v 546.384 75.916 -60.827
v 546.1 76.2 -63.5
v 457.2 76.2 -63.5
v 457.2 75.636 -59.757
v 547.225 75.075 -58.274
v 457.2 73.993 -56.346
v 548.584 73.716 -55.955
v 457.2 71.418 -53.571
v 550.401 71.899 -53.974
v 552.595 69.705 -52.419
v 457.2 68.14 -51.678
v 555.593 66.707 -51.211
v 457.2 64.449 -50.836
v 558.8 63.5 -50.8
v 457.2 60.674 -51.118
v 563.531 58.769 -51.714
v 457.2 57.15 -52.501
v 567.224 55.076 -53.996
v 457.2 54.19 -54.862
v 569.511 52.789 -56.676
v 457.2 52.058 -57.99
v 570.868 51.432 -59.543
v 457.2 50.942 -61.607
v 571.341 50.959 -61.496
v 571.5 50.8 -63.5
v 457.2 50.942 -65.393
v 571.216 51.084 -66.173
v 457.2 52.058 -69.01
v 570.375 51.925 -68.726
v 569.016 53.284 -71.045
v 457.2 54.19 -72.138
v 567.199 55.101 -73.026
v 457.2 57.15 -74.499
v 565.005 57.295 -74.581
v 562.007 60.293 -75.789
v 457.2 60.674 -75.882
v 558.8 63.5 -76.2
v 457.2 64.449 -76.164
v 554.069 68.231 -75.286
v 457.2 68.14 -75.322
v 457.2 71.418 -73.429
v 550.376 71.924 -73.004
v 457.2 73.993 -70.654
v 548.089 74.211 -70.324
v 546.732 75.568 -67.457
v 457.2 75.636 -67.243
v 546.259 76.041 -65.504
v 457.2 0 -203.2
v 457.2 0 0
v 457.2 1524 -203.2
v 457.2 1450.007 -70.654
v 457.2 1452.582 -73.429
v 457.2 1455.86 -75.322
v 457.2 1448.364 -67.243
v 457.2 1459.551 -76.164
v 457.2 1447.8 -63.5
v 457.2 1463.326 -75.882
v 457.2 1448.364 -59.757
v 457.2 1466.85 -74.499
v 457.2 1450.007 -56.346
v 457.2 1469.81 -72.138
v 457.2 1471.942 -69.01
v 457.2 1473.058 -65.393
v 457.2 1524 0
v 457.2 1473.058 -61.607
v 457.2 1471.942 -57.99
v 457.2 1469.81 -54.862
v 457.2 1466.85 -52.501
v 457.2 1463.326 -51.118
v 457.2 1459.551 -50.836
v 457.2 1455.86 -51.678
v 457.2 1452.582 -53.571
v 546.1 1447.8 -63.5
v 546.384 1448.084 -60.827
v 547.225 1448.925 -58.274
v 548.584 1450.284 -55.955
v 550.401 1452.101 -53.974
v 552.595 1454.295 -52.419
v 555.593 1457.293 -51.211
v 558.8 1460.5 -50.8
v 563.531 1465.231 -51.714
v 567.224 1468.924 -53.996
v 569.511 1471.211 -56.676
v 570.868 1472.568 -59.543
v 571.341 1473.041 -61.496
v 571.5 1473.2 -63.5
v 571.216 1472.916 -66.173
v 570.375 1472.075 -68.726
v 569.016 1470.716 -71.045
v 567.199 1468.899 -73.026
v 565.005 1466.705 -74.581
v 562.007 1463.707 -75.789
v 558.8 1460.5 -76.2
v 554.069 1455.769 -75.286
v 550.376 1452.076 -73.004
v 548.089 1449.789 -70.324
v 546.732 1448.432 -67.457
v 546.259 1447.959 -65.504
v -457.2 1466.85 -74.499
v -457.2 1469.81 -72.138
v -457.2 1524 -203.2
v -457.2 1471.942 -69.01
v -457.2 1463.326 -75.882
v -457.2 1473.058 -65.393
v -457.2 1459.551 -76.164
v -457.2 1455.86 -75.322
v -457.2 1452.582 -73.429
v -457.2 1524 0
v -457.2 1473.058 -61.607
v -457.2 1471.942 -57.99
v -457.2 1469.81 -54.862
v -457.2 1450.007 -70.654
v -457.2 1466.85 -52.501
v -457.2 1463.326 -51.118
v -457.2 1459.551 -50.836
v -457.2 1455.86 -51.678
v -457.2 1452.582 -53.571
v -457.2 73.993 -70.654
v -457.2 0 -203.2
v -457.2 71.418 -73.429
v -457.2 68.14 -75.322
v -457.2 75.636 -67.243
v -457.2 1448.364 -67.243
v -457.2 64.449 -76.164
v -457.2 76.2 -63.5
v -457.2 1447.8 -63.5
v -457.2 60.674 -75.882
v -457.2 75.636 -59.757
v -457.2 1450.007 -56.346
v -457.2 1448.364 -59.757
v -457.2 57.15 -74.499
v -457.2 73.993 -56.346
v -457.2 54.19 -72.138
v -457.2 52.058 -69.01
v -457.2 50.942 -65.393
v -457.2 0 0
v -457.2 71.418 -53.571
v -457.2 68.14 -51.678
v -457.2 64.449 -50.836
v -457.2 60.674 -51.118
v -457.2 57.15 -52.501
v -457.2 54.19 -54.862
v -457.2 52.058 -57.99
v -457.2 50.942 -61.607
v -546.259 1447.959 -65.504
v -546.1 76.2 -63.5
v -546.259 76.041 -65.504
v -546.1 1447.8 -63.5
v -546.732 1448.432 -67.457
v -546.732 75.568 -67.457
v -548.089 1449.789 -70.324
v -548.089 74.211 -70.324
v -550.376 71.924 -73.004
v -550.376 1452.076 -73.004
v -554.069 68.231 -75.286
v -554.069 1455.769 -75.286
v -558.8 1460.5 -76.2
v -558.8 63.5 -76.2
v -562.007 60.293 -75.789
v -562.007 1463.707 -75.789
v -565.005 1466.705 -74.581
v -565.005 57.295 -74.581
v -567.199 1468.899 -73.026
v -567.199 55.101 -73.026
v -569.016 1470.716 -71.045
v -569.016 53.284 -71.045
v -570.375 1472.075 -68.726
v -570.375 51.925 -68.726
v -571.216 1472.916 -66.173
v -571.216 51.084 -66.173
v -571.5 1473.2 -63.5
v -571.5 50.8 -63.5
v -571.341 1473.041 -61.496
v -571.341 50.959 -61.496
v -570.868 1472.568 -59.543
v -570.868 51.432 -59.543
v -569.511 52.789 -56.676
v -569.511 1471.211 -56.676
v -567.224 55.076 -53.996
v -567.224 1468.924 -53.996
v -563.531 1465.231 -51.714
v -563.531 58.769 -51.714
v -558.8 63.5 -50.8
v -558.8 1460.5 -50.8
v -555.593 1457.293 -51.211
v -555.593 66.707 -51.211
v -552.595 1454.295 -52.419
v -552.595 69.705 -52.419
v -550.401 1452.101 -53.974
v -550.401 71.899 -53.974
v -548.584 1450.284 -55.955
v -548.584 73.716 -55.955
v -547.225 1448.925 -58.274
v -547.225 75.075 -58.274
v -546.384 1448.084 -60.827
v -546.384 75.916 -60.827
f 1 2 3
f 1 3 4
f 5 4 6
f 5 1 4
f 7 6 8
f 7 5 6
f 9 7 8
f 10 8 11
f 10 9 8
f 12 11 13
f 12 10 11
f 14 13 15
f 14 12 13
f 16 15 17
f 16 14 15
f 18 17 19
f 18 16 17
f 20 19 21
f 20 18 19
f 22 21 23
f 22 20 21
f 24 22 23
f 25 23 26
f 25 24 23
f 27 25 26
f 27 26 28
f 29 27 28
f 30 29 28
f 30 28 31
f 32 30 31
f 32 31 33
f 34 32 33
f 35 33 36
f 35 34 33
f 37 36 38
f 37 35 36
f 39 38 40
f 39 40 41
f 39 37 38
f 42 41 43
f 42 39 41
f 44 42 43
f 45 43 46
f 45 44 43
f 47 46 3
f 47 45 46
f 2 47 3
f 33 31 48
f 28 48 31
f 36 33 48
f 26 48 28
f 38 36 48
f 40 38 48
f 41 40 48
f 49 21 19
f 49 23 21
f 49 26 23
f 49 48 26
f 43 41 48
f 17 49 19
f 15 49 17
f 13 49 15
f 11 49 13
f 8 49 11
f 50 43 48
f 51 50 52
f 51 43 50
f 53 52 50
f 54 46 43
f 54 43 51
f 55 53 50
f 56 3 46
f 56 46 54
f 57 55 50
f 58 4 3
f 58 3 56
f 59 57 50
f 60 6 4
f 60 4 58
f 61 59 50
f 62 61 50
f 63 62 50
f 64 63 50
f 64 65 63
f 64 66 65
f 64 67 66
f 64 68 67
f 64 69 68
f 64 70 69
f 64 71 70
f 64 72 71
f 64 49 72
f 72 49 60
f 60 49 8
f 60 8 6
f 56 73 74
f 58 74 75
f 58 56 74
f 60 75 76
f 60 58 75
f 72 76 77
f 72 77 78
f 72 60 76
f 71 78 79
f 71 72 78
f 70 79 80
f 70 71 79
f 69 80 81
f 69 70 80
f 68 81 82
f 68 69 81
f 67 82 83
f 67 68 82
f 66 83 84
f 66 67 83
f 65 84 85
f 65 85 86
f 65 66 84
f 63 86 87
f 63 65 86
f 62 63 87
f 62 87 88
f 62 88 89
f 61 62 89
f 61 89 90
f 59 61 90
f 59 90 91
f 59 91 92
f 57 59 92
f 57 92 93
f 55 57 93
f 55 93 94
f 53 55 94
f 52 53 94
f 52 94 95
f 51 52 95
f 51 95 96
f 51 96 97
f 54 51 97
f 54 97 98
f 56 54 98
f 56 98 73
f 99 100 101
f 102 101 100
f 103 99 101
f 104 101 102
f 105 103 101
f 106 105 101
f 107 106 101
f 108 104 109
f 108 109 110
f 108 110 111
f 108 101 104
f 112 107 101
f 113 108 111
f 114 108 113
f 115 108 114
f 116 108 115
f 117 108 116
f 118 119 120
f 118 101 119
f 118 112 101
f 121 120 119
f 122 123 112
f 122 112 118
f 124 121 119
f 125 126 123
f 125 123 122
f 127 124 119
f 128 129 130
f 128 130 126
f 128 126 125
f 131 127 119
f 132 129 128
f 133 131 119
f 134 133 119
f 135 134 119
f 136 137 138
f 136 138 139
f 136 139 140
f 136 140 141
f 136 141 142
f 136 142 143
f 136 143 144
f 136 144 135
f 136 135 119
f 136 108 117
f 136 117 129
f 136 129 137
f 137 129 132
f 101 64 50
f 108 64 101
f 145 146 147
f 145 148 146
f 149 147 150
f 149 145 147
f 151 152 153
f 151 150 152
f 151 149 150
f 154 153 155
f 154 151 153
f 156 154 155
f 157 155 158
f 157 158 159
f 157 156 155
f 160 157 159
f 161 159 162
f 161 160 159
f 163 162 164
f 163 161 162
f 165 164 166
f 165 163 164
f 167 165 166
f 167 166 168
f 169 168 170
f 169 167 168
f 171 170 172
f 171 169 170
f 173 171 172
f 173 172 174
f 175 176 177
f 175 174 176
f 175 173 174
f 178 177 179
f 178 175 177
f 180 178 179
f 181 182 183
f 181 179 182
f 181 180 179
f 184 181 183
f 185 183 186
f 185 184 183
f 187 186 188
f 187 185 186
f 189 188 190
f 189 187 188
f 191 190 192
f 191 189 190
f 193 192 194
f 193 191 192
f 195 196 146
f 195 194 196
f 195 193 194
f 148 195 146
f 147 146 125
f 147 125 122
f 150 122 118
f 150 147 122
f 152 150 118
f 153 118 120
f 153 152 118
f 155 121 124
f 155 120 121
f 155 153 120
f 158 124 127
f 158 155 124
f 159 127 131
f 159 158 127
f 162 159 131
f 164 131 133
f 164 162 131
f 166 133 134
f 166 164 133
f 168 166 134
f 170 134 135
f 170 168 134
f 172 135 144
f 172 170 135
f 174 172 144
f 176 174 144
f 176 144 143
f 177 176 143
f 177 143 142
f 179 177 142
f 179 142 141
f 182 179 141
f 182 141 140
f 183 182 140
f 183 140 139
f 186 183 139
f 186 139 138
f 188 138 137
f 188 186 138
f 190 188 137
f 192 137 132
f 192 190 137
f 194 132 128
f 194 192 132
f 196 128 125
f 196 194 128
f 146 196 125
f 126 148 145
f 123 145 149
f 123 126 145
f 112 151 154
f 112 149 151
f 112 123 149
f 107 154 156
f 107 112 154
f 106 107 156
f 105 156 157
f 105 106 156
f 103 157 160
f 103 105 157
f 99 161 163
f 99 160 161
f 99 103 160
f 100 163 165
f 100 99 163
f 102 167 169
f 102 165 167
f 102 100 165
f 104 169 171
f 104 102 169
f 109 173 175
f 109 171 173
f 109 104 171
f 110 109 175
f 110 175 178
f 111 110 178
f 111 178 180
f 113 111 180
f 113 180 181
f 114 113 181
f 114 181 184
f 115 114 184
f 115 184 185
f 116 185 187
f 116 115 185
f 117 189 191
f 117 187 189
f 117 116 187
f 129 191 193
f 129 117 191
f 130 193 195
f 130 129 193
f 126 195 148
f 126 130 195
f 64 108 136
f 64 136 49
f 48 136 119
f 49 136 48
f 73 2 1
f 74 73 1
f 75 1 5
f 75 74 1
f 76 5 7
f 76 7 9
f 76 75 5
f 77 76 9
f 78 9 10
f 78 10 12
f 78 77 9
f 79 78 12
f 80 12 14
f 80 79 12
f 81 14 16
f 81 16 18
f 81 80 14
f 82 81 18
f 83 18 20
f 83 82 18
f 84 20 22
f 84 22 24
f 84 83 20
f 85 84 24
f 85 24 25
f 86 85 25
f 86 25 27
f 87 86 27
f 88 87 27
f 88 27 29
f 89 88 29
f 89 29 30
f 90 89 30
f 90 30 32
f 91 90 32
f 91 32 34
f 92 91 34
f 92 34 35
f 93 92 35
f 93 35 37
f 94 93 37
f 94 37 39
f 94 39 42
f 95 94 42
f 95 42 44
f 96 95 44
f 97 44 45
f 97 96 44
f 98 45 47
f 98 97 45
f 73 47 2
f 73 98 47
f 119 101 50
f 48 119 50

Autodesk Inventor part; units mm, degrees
ref_plane "PLANE IN" through (0, 0, 0) normal (0, 1, 0) x (-1, 0, 0)
ref_plane "PLANE OUT" through (0, 1524, 0) normal (0, 1, 0) x (-1, 0, 0)
ref_plane "PLANE CTR" through (0, 0, 0) normal (1, 0, 0) x (0, 1, 0)
ref_plane "PLANE RH" through (457.2, 0, 0) normal (1, 0, 0) x (0, 1, 0)
ref_plane "PLANE LH" through (-457.2, 0, 0) normal (1, 0, 0) x (0, 1, 0)
ref_plane "PLANE TOP" through (0, 0, 0) normal (0, 0, 1) x (1, 0, 0)
ref_plane "PLANE BOT" through (0, 0, -203.2) normal (0, 0, 1) x (1, 0, 0)
ref_plane "PLANE HANDLE RH" through (558.8, 0, 0) normal (1, 0, 0) x (0, 1, 0)
ref_plane "PLANE HANDLE LH" through (-558.8, 0, 0) normal (1, 0, 0) x (0, 1, 0)
ref_plane "PLANE HANDLE IN" through (0, 63.5, 0) normal (0, 1, 0) x (-1, 0, 0)
ref_plane "PLANE HANDLE OUT" through (0, 1460.5, 0) normal (0, 1, 0) x (-1, 0, 0)
ref_plane "PLANE HANDLE TOP" through (0, 0, -63.5) normal (0, 0, 1) x (1, 0, 0)
sketch "SKETCH BODY" plane through (0, 0, 0) normal (0, 0, 1) x (1, 0, 0)
  line L0 (-457.2, 0) -> (457.2, 0)
  line L1 (457.2, 0) -> (457.2, 1524)
  line L2 (457.2, 1524) -> (-457.2, 1524)
  line L3 (-457.2, 1524) -> (-457.2, 0)
  line L4 (-640.08, 0) -> (640.08, 0) projected
  line L5 (-640.08, 1524) -> (640.08, 1524) projected
  line L6 (457.2, 3657.6) -> (457.2, -609.6) projected
  line L7 (-457.2, 3657.6) -> (-457.2, -609.6) projected
extrude "EXT BODY" add sketch "SKETCH BODY" against normal blind 203.2
sketch "SKETCH HANDLE DIA" plane through (457.2, 0, 0) normal (1, 0, 0) x (0, 1, 0)
  line L0 (45.72, -63.5) -> (81.28, -63.5) projected
  line L1 (63.5, -45.72) -> (63.5, -81.28) projected
  circle A0 centre (63.5, -63.5) radius 12.7
  dimension "d79" = 25.4
sketch "SKETCH HANDLE PATH" plane through (0, 0, -63.5) normal (0, 0, 1) x (1, 0, 0)
  line L0 (558.8, 3568.7) -> (558.8, -520.7) projected
  line L1 (457.2, 3568.7) -> (457.2, -520.7) projected
  line L2 (436.88, 63.5) -> (579.12, 63.5) projected
  line L3 (436.88, 1460.5) -> (579.12, 1460.5) projected
  line L4 (457.2, 63.5) -> (558.8, 63.5)
  line L5 (558.8, 63.5) -> (558.8, 1460.5)
  line L6 (558.8, 1460.5) -> (457.2, 1460.5)
  line L7 (457.2, 1460.5) -> (457.2, 63.5) construction
sweep "SWP HANDLE" add profiles "SKETCH HANDLE DIA" path "SKETCH HANDLE PATH" path curves L4 L5 L6
mirror "MIR HANDLE" about plane through (0, 0, 0) normal (1, 0, 0)
equation "\"d76\" = HEIGHT"
equation "\"PLANE_OUT\" = LENGTH"
equation "\"PLANE_RH\" = 0.5 * WIDTH"
equation "\"PLANE_LH\" = -0.5 * WIDTH"
equation "\"PLANE_BOT\" = -HEIGHT"
equation "\"PLANE_HANDLE_RH\" = HANDLE_OFFSET_CTR"
equation "\"PLANE_HANDLE_LH\" = -HANDLE_OFFSET_CTR"
equation "\"PLANE_HANDLE_IN\" = HANDLE_OFFSET_END"
equation "\"PLANE_HANDLE_OUT\" = LENGTH - HANDLE_OFFSET_END"
equation "\"PLANE_HANDLE_TOP\" = -HANDLE_OFFSET_TOP"
equation "\"LENGTH\" = 1524"
equation "\"WIDTH\" = 914.4"
equation "\"HEIGHT\" = 203.2"
equation "\"HANDLE_GAP\" = 101.6"
equation "\"HANDLE_OFFSET_CTR\" = 0.5 * WIDTH + HANDLE_GAP"
equation "\"HANDLE_OFFSET_END\" = 63.5"
equation "\"HANDLE_OFFSET_TOP\" = 63.5"
properties part number "ATQ-36-60-B"
